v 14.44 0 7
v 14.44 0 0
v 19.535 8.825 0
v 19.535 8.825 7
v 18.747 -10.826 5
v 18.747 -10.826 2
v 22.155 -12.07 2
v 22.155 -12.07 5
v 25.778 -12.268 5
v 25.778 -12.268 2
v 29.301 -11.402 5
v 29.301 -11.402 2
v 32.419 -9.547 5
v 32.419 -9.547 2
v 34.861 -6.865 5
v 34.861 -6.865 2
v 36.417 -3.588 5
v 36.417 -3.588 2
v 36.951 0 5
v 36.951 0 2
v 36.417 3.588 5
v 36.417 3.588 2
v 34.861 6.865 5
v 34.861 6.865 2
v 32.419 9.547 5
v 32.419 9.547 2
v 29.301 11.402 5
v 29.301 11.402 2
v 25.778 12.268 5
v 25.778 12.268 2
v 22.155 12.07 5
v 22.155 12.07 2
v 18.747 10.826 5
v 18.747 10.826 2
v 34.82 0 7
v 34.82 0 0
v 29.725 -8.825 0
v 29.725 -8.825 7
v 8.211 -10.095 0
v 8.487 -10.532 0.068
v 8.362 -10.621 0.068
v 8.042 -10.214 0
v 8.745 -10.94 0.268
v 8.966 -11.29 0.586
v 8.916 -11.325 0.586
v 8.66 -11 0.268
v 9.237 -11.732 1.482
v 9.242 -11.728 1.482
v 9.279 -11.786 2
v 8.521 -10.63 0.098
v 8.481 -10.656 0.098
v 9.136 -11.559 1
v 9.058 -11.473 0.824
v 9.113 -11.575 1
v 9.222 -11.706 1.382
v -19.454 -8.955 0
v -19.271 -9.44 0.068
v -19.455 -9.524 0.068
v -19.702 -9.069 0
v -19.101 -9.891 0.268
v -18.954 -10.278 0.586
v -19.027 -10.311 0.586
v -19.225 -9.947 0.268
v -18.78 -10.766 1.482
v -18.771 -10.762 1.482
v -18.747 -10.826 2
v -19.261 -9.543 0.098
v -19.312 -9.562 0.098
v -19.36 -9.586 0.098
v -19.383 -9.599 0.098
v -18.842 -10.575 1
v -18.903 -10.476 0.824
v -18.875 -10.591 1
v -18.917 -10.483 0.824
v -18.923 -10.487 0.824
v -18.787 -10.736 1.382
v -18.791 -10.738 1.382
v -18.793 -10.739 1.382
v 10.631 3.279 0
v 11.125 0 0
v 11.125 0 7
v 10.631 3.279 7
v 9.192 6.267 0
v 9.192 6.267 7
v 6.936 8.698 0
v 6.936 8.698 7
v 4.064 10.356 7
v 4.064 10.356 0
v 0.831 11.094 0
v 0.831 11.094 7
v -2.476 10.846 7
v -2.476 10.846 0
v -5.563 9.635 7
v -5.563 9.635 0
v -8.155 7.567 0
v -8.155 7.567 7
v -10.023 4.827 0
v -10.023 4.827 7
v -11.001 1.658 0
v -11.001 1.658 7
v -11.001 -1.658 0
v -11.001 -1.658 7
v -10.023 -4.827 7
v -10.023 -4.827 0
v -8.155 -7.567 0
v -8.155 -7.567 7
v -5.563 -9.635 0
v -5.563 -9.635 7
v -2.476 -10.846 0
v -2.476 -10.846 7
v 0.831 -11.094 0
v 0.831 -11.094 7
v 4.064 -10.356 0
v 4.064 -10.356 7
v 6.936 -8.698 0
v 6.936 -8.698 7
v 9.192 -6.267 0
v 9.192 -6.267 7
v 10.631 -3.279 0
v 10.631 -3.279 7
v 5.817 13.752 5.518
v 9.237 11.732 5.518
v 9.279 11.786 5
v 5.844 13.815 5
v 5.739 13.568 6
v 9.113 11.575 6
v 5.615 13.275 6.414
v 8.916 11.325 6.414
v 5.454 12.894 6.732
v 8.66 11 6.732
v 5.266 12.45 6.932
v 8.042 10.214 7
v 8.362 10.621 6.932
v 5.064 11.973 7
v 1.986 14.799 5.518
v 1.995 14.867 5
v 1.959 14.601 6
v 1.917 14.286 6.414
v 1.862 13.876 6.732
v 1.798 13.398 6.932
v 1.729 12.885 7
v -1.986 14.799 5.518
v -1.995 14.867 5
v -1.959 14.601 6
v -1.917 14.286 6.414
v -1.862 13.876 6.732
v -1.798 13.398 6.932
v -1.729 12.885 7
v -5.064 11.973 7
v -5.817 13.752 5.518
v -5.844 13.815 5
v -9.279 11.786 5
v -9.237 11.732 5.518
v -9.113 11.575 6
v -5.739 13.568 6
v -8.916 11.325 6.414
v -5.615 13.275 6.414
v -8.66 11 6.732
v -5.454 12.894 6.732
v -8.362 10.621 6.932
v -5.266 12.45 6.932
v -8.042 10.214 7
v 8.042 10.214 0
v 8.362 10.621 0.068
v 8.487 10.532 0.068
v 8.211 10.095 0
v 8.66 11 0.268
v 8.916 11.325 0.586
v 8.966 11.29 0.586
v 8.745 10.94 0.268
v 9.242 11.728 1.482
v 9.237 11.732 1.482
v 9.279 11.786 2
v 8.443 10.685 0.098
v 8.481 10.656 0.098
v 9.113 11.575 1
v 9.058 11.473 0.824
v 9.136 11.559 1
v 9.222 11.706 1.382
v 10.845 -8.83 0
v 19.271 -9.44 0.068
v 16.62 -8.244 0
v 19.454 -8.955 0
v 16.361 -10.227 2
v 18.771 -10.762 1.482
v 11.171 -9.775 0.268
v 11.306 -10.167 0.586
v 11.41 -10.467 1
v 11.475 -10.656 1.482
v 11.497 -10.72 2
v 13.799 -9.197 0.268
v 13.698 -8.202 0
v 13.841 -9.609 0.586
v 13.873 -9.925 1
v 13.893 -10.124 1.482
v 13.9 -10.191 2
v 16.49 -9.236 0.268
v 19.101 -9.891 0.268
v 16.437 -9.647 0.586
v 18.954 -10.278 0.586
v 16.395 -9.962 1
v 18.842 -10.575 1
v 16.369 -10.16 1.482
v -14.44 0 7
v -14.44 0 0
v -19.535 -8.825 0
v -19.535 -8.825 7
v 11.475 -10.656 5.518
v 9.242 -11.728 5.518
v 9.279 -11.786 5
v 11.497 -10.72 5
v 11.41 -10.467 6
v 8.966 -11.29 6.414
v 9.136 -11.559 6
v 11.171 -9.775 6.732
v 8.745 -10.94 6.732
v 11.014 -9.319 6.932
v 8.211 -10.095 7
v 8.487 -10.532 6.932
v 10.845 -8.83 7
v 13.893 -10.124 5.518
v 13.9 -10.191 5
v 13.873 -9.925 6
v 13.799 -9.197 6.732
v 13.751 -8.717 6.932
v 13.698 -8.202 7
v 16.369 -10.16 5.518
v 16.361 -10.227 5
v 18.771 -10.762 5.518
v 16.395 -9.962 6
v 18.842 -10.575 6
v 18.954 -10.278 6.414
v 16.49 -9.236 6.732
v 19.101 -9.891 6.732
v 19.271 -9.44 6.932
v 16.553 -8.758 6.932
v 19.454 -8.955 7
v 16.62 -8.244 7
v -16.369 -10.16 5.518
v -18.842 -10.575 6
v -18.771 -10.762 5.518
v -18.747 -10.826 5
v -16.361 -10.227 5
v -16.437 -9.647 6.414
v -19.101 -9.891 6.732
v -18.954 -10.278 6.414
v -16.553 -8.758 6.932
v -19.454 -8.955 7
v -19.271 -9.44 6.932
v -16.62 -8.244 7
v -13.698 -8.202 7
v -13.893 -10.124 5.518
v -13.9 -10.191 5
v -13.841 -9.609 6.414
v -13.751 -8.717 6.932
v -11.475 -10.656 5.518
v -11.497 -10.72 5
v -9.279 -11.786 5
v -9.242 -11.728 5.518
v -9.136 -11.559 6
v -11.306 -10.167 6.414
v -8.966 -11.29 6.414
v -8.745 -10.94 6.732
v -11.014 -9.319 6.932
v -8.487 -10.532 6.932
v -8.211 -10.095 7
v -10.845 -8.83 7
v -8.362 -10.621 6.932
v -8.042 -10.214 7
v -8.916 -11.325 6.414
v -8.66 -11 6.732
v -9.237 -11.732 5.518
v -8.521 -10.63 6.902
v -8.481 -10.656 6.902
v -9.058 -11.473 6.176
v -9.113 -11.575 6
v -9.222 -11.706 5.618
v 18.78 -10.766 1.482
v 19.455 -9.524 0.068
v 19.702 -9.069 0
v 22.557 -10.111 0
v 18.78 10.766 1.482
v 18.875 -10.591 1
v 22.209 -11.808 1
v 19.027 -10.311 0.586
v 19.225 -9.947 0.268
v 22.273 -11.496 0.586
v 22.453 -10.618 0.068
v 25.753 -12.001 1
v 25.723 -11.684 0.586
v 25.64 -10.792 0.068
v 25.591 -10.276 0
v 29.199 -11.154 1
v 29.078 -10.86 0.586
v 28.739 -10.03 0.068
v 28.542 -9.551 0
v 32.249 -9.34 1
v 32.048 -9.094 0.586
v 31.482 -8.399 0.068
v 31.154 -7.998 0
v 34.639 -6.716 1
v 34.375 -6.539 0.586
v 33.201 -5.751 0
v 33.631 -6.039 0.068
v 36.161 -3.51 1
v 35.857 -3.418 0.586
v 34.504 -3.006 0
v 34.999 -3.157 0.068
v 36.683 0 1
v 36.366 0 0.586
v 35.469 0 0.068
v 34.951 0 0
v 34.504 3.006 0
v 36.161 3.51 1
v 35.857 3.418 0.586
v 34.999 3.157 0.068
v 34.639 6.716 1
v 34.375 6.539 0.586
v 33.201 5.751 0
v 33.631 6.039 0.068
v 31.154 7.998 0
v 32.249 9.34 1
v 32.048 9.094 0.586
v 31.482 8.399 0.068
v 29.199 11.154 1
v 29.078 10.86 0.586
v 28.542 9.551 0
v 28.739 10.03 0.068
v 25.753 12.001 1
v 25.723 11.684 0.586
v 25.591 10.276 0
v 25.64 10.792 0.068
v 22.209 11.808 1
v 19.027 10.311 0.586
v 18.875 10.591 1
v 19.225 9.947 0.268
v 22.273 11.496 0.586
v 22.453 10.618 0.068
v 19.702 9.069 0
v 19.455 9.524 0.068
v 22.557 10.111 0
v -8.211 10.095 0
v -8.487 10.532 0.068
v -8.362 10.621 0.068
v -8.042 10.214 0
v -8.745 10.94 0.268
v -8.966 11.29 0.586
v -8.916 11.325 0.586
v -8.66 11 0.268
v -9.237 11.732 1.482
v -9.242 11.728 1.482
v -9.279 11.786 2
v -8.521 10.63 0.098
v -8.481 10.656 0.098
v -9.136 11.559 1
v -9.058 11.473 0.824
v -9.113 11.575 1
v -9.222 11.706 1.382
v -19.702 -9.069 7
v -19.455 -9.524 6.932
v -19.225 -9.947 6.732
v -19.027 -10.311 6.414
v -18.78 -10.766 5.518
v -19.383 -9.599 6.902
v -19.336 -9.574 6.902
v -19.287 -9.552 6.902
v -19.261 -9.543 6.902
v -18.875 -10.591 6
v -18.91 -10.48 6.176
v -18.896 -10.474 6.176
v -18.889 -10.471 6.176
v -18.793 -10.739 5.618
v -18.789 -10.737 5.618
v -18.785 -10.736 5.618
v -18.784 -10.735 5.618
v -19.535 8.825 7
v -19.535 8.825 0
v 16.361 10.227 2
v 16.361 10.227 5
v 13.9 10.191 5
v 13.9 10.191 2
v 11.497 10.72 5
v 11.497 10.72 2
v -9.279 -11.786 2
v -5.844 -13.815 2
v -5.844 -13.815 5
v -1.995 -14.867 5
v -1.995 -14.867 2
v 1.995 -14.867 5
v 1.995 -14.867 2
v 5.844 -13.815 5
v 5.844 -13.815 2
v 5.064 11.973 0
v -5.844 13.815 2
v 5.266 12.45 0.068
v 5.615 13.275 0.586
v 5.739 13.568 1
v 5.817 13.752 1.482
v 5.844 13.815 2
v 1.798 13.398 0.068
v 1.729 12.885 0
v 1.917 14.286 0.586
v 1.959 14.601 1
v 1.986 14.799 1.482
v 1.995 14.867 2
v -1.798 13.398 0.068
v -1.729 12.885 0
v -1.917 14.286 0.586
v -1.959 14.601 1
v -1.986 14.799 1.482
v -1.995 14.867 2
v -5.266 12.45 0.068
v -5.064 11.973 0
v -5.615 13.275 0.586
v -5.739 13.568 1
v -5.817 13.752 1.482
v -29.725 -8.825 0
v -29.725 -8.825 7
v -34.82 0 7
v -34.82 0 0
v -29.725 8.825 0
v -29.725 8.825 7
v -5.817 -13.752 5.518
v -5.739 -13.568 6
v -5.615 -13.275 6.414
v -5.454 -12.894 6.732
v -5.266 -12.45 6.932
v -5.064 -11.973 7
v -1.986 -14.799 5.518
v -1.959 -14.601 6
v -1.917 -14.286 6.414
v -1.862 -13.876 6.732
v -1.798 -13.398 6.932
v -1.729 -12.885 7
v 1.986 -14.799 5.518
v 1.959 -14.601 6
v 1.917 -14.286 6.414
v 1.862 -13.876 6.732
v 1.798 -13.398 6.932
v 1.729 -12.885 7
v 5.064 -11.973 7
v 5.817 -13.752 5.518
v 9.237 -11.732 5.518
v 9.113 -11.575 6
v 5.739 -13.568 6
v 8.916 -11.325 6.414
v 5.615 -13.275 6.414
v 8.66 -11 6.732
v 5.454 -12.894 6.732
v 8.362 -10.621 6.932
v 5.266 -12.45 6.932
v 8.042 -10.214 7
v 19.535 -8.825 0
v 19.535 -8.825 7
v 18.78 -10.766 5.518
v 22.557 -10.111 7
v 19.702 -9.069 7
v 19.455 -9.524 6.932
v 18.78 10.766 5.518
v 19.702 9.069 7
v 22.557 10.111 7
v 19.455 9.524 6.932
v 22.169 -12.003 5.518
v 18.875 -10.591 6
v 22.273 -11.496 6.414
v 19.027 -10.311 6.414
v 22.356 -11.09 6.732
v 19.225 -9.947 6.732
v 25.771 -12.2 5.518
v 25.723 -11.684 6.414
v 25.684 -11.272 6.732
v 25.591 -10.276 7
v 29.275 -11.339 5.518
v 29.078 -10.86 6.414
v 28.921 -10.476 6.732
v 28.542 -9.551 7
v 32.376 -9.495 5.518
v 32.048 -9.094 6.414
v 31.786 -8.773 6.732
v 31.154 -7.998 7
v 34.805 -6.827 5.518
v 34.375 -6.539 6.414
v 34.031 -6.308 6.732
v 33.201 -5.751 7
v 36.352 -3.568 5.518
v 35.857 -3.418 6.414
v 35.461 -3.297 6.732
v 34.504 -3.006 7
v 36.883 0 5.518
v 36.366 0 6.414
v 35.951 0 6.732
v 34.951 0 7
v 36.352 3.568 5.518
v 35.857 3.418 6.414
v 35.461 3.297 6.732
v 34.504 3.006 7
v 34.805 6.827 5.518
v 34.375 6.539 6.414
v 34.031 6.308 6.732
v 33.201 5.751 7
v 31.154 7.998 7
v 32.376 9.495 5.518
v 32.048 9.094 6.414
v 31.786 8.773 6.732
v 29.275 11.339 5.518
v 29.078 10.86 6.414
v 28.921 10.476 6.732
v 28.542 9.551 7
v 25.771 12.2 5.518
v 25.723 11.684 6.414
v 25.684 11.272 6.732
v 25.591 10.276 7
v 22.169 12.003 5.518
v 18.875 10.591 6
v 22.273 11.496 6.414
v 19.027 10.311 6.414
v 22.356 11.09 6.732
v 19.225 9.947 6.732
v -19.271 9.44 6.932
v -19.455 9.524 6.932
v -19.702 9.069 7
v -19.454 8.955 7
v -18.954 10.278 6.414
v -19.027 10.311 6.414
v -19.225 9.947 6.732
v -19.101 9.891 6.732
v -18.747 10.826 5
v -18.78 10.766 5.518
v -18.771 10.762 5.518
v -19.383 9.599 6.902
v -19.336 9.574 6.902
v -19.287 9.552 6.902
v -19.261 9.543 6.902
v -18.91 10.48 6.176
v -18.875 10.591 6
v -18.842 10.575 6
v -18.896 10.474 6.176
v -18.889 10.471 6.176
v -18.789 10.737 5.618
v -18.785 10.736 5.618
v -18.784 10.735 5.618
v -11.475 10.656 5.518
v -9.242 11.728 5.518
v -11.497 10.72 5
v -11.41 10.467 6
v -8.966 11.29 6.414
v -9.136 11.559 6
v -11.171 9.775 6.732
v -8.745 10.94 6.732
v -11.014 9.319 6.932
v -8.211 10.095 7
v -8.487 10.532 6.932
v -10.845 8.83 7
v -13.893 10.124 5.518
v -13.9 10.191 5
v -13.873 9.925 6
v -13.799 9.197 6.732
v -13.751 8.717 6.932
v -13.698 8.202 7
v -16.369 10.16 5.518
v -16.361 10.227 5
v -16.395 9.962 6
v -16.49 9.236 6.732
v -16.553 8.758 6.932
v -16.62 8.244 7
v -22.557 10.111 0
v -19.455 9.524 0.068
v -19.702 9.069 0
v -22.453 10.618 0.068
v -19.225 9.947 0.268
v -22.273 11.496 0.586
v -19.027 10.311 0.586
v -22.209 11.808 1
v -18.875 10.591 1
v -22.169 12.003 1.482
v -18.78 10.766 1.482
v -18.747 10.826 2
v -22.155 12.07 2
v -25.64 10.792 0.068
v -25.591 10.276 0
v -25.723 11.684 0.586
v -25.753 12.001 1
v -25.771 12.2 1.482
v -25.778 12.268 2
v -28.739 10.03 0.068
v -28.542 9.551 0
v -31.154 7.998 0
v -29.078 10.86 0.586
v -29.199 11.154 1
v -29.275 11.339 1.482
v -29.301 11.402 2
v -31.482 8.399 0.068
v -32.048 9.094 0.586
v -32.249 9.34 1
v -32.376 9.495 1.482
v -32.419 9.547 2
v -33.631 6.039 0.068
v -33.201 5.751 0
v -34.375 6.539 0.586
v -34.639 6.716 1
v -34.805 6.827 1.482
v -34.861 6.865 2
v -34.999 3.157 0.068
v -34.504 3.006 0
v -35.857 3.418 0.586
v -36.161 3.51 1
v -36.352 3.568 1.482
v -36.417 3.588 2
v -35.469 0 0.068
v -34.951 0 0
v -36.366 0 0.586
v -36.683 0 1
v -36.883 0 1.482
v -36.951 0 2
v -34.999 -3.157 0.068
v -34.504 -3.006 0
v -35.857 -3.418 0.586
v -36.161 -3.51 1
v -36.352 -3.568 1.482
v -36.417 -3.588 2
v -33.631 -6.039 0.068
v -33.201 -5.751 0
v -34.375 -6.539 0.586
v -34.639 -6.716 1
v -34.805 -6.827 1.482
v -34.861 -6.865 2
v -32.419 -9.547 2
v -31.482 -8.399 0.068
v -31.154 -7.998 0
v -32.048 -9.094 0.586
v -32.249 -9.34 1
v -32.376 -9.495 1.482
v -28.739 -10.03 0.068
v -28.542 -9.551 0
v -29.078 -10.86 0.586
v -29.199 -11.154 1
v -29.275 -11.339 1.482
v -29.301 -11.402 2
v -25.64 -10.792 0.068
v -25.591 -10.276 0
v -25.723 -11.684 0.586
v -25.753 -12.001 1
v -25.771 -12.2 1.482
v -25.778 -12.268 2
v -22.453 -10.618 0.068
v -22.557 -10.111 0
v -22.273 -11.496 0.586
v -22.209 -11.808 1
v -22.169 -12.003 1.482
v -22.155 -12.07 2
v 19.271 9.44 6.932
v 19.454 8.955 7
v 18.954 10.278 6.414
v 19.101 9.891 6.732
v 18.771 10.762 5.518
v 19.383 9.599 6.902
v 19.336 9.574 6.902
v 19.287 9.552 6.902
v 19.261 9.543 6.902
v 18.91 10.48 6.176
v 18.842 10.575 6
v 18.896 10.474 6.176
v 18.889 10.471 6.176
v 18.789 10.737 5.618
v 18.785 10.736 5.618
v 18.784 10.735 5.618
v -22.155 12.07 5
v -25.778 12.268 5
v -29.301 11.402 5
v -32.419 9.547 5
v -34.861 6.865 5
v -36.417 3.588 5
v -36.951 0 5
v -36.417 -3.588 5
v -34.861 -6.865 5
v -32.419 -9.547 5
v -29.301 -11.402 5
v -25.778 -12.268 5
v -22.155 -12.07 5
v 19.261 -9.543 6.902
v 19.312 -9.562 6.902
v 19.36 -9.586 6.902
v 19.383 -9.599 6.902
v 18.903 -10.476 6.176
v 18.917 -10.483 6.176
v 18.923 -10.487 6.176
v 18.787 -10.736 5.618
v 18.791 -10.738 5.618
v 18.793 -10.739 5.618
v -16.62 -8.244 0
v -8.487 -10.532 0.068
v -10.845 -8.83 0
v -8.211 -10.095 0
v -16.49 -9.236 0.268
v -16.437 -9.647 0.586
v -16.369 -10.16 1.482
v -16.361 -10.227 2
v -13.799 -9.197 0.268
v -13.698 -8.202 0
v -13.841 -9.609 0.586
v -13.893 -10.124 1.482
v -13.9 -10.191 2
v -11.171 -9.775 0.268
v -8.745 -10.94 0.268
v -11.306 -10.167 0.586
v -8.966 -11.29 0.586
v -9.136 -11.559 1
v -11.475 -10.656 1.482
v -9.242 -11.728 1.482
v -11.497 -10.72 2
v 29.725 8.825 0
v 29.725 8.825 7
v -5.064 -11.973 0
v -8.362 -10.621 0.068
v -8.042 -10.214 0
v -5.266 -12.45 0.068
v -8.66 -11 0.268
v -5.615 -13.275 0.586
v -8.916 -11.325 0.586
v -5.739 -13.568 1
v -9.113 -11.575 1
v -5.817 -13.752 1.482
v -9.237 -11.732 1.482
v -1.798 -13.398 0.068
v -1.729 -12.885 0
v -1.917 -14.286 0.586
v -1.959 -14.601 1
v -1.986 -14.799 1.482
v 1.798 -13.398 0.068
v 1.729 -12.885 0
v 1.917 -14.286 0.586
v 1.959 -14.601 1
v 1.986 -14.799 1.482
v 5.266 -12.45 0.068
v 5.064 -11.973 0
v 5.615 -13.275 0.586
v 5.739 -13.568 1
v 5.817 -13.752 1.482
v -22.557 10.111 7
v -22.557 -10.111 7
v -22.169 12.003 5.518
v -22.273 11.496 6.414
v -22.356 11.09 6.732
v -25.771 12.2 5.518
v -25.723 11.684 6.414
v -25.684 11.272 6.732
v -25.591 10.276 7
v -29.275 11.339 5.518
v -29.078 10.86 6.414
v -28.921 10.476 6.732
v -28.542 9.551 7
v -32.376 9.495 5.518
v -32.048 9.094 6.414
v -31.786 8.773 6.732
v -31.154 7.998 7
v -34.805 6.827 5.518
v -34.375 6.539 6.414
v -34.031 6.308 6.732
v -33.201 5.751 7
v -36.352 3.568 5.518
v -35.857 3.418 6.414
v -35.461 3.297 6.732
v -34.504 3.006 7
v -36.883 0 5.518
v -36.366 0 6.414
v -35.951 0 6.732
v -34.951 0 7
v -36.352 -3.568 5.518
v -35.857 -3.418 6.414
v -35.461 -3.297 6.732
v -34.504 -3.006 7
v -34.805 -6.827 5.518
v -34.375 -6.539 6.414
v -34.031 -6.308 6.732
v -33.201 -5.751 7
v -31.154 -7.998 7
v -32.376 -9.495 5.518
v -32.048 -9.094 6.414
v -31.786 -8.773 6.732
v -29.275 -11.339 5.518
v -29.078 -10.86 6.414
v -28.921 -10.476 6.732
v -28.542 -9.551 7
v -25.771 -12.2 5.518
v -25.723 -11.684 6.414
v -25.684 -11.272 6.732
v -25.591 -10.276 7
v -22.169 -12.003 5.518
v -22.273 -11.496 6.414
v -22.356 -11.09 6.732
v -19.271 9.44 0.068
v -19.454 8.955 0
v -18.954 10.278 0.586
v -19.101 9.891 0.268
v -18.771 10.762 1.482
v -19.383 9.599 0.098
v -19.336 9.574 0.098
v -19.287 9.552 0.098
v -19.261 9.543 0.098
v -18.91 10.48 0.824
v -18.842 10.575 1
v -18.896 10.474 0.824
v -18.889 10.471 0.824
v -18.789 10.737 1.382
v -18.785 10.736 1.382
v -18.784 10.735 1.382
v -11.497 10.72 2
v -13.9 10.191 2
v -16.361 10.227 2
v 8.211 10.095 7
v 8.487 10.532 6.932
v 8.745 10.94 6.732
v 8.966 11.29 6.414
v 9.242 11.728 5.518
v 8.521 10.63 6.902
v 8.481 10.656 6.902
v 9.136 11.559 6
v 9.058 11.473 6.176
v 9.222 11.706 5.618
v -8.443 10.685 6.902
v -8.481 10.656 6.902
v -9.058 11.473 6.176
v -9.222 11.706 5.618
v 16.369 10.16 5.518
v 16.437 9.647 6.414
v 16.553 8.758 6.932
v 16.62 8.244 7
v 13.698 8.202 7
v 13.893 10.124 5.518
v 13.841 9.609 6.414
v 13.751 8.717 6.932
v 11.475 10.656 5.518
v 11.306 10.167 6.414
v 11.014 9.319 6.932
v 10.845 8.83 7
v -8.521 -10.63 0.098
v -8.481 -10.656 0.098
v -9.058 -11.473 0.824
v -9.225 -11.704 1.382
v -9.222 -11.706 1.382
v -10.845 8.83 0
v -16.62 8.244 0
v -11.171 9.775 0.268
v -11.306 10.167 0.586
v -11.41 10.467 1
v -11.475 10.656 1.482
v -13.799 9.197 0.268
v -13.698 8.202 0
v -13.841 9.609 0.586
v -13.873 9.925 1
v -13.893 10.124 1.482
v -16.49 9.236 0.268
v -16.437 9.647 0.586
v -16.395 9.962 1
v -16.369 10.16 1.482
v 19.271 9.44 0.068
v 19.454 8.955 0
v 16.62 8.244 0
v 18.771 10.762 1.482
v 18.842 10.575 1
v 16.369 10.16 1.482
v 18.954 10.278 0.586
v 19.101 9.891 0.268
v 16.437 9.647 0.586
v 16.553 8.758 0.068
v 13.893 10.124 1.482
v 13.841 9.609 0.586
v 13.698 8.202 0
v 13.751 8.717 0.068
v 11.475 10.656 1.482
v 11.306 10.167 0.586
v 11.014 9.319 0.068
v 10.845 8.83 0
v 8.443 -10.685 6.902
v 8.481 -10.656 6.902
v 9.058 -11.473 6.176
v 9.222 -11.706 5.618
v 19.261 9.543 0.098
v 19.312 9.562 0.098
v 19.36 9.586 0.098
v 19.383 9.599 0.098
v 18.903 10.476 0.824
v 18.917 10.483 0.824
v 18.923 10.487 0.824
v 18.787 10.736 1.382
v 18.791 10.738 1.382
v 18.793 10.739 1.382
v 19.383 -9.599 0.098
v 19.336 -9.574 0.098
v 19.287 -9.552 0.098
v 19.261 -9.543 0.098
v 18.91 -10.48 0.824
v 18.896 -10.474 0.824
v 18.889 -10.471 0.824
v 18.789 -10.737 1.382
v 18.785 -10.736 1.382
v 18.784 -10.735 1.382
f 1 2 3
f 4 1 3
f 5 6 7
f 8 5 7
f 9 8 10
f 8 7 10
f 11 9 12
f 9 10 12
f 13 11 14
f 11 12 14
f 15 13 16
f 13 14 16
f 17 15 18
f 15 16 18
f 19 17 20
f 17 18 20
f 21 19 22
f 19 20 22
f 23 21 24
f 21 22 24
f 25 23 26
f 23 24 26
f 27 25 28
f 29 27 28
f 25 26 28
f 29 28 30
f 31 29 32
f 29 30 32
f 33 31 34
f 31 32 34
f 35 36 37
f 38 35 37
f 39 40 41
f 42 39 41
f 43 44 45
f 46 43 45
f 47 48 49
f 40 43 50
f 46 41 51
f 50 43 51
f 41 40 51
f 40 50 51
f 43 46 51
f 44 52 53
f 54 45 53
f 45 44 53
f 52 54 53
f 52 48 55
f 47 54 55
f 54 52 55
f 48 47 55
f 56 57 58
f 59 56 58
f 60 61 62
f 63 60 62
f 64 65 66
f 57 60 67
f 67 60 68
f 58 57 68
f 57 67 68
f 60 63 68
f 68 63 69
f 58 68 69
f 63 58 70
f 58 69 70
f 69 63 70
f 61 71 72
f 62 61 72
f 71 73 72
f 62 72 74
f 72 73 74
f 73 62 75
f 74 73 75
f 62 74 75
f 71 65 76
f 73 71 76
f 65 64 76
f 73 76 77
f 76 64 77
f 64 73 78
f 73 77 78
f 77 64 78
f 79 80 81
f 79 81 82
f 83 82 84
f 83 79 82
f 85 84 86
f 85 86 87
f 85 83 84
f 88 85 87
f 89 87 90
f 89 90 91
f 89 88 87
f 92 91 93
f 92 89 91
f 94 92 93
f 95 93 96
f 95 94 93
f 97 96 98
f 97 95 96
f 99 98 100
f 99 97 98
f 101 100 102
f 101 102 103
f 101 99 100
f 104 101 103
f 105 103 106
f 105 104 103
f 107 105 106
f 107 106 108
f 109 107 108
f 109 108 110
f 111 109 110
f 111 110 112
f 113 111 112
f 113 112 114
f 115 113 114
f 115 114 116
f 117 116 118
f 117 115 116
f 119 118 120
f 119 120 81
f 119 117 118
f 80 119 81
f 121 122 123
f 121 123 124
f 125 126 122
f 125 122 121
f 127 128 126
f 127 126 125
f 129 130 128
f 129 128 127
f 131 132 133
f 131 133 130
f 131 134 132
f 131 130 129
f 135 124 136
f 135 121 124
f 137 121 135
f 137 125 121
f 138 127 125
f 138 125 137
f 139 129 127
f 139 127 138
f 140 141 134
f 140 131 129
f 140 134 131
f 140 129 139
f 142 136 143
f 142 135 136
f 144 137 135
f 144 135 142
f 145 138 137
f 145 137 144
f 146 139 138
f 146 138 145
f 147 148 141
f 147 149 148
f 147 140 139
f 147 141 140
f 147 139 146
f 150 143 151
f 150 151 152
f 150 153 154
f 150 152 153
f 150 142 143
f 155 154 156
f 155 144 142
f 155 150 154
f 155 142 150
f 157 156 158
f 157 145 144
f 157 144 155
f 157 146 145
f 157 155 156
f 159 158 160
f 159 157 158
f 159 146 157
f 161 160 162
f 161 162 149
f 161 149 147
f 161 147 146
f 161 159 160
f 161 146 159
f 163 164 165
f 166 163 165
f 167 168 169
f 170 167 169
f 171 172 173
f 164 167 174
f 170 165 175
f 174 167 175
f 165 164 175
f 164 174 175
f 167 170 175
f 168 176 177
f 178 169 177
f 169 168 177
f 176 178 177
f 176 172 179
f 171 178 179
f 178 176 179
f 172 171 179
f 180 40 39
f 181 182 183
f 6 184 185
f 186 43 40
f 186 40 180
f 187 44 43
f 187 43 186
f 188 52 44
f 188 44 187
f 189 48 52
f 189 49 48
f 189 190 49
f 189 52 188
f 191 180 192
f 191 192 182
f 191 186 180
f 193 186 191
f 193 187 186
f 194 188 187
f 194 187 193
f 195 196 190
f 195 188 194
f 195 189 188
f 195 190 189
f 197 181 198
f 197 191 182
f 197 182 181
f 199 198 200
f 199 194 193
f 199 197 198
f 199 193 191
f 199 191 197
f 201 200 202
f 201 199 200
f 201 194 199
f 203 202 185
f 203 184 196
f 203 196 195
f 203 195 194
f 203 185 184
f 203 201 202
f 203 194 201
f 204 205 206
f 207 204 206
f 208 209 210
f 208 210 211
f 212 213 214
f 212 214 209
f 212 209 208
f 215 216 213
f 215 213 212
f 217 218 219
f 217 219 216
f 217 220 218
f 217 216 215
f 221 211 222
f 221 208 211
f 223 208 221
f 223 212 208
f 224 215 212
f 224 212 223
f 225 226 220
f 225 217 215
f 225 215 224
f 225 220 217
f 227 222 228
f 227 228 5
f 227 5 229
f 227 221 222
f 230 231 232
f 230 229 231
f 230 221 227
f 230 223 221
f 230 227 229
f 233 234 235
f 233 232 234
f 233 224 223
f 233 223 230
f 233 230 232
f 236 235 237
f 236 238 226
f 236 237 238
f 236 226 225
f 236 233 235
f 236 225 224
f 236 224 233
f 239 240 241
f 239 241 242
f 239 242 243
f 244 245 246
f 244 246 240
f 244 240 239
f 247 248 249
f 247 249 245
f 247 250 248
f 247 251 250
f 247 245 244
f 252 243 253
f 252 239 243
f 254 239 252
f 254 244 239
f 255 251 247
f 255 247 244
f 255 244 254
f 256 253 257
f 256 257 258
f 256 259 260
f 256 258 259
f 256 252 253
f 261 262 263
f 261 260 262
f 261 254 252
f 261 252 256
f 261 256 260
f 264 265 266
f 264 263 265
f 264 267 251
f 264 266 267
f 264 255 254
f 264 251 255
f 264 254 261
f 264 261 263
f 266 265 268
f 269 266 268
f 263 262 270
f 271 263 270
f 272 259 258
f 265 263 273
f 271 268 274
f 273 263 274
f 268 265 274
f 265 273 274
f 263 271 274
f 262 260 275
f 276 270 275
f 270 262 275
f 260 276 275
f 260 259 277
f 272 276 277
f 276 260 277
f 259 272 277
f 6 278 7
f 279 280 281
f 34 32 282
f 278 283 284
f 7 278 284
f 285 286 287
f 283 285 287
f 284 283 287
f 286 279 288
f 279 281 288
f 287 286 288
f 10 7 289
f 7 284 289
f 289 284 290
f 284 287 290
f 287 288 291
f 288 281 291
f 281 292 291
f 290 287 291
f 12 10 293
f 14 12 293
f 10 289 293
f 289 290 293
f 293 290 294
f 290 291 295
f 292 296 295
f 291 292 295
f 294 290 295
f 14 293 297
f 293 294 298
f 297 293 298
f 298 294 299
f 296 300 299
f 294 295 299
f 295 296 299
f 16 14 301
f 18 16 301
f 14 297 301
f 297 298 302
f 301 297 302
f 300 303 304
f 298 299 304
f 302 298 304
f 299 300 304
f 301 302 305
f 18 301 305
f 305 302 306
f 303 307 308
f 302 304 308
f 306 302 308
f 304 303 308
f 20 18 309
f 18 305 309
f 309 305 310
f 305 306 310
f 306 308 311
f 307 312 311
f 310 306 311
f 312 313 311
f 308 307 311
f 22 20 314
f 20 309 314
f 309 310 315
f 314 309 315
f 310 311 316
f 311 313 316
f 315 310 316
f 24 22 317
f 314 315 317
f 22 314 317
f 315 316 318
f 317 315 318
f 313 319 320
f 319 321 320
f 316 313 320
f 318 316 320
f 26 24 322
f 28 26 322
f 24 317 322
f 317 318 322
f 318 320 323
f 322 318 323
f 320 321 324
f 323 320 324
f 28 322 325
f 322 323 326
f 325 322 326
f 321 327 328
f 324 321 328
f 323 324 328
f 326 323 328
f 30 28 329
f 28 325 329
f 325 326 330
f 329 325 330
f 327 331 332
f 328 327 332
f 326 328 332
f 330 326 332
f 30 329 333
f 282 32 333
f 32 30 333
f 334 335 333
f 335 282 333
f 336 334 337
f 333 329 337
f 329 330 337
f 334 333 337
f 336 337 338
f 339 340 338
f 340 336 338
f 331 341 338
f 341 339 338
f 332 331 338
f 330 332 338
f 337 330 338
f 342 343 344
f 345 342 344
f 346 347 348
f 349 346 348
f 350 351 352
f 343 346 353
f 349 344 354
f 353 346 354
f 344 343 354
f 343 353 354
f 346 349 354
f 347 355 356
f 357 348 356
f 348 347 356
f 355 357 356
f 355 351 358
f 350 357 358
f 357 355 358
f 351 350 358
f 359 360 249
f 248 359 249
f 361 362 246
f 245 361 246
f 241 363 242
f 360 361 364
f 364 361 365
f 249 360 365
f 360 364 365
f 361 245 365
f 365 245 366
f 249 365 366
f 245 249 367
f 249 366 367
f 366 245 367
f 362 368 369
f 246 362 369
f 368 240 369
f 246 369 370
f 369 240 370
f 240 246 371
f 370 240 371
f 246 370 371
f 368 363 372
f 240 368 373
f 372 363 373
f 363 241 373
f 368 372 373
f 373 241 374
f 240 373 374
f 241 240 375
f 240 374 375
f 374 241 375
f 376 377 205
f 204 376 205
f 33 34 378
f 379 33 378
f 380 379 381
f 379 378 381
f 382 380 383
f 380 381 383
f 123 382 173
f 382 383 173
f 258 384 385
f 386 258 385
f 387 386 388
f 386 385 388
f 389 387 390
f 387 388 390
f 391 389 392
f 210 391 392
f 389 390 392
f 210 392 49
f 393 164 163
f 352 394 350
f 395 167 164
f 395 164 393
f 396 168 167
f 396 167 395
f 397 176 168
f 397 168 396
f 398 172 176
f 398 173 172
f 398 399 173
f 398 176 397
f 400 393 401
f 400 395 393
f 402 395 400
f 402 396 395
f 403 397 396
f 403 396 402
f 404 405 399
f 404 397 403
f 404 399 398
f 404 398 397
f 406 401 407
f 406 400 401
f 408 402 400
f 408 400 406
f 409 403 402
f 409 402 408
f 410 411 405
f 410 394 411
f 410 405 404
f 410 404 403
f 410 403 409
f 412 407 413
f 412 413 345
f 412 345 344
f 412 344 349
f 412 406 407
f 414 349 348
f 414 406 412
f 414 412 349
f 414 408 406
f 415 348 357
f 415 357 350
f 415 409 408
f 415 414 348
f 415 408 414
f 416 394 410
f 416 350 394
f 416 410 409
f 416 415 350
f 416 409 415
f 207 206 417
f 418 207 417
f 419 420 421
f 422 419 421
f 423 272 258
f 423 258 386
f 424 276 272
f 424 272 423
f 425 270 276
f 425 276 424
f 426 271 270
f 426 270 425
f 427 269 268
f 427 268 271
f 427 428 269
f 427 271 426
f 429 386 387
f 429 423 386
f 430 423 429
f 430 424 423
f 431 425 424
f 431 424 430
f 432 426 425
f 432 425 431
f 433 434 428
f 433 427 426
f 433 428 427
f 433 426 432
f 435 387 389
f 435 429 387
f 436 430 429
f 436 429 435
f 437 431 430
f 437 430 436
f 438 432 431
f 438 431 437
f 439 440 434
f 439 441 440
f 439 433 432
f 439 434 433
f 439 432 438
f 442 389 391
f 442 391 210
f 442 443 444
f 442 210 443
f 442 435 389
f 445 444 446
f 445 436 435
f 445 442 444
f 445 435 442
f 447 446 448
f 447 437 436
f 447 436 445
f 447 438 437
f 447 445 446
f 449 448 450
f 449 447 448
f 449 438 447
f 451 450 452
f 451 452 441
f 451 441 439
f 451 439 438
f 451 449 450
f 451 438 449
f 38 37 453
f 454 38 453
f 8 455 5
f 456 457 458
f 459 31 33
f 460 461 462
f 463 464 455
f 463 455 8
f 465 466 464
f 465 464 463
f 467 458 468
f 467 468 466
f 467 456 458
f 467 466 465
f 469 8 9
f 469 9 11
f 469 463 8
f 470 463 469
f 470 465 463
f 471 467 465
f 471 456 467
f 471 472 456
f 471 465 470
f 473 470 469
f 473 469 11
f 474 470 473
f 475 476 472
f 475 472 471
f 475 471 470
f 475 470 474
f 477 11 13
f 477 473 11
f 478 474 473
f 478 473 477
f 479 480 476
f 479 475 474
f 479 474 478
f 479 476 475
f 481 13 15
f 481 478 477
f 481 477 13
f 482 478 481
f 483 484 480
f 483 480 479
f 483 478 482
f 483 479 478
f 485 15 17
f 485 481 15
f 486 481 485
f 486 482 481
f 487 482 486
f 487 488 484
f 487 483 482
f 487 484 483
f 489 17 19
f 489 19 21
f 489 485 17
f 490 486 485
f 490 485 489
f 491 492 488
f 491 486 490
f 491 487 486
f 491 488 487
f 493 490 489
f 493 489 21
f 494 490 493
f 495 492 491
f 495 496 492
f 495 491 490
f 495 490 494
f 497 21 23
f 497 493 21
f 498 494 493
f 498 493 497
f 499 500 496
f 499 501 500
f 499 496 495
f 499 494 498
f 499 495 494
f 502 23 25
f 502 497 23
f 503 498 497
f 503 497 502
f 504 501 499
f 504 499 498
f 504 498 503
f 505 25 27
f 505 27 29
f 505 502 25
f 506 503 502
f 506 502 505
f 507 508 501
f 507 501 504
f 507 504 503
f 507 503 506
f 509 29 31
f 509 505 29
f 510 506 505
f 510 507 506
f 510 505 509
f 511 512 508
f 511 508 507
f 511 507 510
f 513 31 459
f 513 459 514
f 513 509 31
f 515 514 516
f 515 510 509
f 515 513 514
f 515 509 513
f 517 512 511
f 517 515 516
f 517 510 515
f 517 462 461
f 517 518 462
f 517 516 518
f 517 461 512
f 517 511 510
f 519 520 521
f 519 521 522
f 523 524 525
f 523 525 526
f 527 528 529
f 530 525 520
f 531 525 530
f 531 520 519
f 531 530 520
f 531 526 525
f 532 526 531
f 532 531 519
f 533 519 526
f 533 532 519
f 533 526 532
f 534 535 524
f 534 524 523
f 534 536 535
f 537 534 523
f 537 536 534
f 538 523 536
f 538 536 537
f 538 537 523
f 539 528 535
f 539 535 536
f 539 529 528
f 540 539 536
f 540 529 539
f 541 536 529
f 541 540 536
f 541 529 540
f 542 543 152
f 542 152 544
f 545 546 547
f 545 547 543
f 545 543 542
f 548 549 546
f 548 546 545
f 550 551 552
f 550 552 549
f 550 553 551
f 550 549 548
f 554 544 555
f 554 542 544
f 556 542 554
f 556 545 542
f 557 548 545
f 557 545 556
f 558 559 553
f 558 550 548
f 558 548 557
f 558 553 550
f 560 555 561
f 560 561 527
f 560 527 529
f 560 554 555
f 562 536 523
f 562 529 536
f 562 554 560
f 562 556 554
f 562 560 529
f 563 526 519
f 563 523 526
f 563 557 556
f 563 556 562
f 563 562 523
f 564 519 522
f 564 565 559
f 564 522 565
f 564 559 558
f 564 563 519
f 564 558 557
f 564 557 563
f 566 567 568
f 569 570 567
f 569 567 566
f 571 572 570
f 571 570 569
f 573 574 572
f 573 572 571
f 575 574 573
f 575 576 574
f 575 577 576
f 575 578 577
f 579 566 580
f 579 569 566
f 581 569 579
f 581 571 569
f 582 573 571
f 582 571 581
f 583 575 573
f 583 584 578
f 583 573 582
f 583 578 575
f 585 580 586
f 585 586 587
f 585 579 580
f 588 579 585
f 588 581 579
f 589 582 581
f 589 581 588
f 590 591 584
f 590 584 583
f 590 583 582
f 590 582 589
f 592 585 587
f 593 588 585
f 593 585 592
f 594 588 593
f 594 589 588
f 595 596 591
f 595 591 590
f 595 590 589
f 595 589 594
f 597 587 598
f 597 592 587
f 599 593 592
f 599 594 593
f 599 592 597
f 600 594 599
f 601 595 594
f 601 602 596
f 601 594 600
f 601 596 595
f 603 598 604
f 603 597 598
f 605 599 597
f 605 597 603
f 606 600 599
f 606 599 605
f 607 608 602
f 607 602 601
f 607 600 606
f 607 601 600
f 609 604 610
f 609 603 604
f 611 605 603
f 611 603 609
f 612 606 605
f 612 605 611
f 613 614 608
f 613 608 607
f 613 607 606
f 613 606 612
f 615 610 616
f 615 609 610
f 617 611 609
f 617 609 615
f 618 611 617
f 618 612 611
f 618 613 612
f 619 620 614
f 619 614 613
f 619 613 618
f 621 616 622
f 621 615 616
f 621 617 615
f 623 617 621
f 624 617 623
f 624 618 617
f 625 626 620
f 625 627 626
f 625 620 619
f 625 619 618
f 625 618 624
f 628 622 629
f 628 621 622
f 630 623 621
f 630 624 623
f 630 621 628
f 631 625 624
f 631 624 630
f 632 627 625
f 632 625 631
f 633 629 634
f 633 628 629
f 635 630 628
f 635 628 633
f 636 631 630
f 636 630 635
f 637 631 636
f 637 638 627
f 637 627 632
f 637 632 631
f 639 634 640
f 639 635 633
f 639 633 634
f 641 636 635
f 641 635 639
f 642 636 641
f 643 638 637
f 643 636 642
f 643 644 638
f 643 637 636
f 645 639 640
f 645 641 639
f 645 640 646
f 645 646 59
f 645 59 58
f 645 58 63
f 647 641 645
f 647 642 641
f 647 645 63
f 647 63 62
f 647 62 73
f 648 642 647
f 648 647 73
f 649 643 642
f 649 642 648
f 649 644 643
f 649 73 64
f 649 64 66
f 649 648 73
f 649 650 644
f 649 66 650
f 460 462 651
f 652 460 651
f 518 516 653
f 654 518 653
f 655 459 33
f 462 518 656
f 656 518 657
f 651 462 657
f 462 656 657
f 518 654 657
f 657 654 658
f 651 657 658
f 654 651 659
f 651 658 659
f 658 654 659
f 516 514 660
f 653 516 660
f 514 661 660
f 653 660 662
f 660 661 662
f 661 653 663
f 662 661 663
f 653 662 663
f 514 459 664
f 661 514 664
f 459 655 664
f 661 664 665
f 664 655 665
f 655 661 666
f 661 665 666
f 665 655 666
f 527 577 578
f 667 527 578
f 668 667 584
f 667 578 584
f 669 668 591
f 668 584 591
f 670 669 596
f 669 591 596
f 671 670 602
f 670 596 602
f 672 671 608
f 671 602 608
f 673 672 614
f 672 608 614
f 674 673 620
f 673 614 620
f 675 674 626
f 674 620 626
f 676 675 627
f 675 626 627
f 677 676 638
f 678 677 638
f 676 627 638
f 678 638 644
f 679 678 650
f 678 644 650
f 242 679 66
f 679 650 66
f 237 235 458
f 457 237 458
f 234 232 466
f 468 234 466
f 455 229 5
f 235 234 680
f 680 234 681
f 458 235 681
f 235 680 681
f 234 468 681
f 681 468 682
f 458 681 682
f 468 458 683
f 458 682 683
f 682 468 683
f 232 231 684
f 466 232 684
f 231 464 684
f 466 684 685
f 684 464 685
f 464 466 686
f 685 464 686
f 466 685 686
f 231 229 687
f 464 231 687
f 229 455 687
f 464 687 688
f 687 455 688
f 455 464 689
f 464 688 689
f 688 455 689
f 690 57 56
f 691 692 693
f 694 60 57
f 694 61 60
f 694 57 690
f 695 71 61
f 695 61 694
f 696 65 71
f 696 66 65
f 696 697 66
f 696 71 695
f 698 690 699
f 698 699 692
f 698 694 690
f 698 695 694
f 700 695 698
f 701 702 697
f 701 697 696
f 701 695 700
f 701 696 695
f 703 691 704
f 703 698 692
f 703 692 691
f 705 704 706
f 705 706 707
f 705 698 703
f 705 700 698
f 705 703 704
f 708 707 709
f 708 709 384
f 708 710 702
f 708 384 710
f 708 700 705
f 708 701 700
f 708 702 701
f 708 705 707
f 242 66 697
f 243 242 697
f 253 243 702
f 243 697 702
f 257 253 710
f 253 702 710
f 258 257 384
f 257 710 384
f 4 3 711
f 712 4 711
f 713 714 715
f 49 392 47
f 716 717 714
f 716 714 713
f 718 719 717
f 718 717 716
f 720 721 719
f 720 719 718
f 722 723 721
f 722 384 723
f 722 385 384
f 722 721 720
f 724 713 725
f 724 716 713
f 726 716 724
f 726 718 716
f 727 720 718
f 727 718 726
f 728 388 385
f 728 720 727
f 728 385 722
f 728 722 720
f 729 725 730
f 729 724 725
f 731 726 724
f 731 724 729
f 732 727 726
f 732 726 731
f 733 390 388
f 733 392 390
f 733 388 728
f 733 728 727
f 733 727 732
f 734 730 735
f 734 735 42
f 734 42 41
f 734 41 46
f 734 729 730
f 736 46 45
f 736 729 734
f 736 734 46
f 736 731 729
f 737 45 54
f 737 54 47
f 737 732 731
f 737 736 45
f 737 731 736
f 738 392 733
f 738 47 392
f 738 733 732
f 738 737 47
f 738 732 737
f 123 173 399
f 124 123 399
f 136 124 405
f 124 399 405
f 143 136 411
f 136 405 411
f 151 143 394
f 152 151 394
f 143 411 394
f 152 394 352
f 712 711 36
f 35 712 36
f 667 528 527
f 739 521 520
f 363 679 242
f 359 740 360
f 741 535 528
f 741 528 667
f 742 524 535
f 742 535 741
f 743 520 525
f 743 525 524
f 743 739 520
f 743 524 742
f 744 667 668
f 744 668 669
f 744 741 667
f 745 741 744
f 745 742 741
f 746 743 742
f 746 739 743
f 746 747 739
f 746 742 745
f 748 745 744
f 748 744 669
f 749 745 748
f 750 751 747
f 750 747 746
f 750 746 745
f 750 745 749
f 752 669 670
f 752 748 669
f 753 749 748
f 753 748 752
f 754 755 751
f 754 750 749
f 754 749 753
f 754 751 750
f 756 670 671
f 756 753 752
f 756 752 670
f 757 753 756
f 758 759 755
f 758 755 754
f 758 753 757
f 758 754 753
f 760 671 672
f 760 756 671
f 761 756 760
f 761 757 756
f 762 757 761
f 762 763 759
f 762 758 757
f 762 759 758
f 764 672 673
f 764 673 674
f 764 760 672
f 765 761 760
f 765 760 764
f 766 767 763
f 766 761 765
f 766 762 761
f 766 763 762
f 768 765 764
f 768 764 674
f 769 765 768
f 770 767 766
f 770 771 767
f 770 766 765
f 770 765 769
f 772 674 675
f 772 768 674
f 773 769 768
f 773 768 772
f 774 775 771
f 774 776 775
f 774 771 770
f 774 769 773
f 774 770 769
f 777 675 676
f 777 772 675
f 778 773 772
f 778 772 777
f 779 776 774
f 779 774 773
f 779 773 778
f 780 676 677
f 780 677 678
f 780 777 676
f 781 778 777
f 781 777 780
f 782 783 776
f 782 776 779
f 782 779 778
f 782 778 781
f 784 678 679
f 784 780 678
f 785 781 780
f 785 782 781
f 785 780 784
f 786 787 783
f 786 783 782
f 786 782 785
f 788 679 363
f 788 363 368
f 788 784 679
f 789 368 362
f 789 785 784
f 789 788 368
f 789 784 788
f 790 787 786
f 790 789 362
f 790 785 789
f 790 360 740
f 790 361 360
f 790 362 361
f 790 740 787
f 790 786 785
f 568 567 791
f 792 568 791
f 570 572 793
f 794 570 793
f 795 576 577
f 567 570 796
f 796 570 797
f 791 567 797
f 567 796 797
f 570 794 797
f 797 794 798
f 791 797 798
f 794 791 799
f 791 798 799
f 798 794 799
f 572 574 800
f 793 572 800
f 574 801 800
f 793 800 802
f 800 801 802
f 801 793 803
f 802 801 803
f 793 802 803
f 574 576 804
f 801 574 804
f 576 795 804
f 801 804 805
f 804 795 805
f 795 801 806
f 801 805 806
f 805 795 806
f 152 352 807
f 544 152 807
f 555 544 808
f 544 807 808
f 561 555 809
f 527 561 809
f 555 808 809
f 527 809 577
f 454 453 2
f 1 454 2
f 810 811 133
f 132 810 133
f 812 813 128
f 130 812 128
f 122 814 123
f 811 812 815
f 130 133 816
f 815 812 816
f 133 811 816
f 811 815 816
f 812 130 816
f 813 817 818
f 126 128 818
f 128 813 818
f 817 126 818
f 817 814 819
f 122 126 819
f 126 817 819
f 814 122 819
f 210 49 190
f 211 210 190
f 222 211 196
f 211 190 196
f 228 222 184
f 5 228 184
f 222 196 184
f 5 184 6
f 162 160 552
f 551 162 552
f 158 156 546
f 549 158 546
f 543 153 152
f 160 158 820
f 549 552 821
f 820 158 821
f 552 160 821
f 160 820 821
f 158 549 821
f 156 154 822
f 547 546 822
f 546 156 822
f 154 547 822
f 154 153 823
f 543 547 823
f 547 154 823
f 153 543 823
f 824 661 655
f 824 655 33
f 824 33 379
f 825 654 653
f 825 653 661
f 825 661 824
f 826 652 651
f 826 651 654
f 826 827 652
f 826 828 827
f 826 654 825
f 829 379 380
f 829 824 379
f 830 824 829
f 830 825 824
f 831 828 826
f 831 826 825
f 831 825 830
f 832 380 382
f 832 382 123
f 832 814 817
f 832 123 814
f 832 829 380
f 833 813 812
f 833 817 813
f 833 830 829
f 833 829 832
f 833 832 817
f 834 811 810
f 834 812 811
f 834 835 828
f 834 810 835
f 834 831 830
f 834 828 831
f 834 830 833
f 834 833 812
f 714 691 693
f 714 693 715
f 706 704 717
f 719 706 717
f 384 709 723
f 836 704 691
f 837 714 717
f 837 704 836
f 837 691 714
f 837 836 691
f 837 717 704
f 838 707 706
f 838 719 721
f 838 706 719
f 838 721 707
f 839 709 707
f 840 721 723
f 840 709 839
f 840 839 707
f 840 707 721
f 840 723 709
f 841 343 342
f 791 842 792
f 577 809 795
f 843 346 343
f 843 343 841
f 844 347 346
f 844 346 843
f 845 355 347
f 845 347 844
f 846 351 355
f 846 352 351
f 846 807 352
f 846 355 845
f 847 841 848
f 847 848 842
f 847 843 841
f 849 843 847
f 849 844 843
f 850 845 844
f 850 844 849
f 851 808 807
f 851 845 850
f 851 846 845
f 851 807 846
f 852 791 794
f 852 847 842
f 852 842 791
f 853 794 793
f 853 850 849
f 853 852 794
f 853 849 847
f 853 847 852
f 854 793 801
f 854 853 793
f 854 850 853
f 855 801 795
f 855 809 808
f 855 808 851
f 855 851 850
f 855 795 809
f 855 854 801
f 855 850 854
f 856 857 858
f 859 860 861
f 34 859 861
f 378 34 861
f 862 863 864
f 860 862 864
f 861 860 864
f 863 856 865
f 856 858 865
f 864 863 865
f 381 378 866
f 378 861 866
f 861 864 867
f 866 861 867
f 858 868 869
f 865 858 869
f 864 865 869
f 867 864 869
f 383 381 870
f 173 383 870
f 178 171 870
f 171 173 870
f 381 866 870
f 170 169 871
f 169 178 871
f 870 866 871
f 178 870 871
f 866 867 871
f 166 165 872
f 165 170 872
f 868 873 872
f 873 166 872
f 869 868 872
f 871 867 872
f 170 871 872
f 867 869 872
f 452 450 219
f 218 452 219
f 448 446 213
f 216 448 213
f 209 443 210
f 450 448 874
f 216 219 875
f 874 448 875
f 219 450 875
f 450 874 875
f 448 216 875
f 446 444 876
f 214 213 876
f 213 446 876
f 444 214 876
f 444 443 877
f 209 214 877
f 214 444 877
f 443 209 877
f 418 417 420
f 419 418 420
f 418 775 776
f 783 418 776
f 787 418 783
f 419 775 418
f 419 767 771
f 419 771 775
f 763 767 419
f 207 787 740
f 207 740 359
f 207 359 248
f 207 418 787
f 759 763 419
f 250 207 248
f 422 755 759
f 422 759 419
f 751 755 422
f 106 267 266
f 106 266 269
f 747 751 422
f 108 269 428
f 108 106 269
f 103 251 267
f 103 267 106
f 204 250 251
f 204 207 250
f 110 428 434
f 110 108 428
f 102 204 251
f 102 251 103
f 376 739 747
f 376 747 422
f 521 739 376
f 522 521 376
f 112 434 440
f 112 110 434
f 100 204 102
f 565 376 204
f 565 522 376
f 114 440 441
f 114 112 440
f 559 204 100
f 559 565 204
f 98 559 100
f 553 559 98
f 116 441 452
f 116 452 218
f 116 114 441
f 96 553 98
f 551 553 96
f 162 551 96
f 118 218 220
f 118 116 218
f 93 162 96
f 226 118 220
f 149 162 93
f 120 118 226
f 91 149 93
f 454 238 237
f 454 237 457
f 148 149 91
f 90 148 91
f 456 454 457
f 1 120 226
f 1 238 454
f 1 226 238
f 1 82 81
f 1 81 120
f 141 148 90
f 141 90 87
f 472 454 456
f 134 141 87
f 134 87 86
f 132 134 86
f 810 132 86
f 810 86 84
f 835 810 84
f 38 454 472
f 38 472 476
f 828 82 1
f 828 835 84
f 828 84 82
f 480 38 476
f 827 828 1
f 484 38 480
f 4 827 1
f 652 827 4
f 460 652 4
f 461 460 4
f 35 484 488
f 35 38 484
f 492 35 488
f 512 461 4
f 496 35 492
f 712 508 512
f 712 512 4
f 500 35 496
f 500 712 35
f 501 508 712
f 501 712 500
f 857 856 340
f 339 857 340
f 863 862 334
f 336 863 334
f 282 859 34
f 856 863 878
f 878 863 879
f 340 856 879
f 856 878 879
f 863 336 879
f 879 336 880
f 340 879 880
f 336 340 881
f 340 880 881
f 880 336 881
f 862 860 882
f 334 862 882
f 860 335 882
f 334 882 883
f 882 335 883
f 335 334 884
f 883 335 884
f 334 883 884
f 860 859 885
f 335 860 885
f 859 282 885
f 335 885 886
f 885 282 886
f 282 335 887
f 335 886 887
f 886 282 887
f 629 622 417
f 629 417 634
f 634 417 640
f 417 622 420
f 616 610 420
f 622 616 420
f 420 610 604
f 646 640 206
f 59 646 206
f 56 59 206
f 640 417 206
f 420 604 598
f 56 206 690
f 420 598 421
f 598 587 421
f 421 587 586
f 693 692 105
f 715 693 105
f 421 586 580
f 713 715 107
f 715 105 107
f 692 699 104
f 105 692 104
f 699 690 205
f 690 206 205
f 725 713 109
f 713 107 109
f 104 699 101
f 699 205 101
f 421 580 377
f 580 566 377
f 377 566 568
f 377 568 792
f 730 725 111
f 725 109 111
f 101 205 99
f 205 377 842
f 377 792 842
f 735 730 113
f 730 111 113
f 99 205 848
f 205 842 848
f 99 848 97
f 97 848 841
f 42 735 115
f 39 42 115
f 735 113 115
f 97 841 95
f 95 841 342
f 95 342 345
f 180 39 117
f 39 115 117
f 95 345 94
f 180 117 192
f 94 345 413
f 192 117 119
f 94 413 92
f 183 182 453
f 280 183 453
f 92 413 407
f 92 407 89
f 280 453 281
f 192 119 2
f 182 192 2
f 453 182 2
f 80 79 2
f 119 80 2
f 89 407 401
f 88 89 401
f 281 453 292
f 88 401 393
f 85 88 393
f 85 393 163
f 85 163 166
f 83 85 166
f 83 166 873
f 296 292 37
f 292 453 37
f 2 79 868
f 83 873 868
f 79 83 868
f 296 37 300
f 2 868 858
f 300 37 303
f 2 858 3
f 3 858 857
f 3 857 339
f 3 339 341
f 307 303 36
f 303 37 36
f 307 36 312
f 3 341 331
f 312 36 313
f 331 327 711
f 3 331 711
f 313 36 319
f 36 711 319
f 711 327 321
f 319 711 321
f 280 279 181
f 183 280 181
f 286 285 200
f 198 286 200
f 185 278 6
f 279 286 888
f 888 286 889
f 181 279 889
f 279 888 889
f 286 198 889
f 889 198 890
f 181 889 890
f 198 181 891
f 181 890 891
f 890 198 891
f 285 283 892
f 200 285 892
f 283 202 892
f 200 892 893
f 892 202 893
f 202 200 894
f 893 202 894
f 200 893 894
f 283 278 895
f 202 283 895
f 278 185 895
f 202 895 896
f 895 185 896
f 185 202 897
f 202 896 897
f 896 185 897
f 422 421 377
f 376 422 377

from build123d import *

# Parameters (mm, degrees)
F0_R     = 11.125
F1_DEPTH = 7
F2_R     = 2
F3_R     = 2


with BuildPart() as f1:
    # F0 (on Top) → F1 (new body)
    with BuildSketch(Plane.XY):
        with BuildLine():
            ThreePointArc((18.74733, 10.826125), (13.90015, 10.191447), (9.27886, 11.785701))
            ThreePointArc((9.27886, 11.785701), (0, 15), (-9.27886, 11.785701))
            ThreePointArc((-9.27886, 11.785701), (-13.90015, 10.191447), (-18.74733, 10.826125))
            ThreePointArc((-18.74733, 10.826125), (-36.951446, 0), (-18.74733, -10.826125))
            ThreePointArc((-18.74733, -10.826125), (-13.90015, -10.191447), (-9.27886, -11.785701))
            ThreePointArc((-9.27886, -11.785701), (0, -15), (9.27886, -11.785701))
            ThreePointArc((9.27886, -11.785701), (13.90015, -10.191447), (18.74733, -10.826125))
            ThreePointArc((18.74733, -10.826125), (36.951446, 0), (18.74733, 10.826125))
        make_face()
        Polygon((-29.725315, 8.825), (-19.535083, 8.825), (-14.439967, 0), (-19.535083, -8.825), (-29.725315, -8.825), (-34.820431, 0), align=None, mode=Mode.SUBTRACT)
        Circle(F0_R, mode=Mode.SUBTRACT)
        Polygon((14.439967, 0), (19.535083, 8.825), (29.725315, 8.825), (34.820431, 0), (29.725315, -8.825), (19.535083, -8.825), align=None, mode=Mode.SUBTRACT)
    extrude(amount=F1_DEPTH)

    # F2
    f2_edges = [f1.edges().sort_by_distance(p)[0] for p in [
        (-36.951446, 0, 7),
        (-13.90015, -10.191447, 7),
        (0, -15, 7),
        (13.90015, -10.191447, 7),
        (36.951446, 0, 7),
        (13.90015, 10.191447, 7),
        (0, 15, 7),
        (-13.90015, 10.191447, 7),
    ]]
    fillet(f2_edges, radius=F2_R)

    # F3
    f3_edges = [f1.edges().sort_by_distance(p)[0] for p in [
        (-13.90015, -10.191447, 0),
        (-36.951446, 0, 0),
        (-13.90015, 10.191447, 0),
        (0, 15, 0),
        (13.90015, 10.191447, 0),
        (36.951446, 0, 0),
        (13.90015, -10.191447, 0),
        (0, -15, 0),
    ]]
    fillet(f3_edges, radius=F3_R)


solid = f1.part
